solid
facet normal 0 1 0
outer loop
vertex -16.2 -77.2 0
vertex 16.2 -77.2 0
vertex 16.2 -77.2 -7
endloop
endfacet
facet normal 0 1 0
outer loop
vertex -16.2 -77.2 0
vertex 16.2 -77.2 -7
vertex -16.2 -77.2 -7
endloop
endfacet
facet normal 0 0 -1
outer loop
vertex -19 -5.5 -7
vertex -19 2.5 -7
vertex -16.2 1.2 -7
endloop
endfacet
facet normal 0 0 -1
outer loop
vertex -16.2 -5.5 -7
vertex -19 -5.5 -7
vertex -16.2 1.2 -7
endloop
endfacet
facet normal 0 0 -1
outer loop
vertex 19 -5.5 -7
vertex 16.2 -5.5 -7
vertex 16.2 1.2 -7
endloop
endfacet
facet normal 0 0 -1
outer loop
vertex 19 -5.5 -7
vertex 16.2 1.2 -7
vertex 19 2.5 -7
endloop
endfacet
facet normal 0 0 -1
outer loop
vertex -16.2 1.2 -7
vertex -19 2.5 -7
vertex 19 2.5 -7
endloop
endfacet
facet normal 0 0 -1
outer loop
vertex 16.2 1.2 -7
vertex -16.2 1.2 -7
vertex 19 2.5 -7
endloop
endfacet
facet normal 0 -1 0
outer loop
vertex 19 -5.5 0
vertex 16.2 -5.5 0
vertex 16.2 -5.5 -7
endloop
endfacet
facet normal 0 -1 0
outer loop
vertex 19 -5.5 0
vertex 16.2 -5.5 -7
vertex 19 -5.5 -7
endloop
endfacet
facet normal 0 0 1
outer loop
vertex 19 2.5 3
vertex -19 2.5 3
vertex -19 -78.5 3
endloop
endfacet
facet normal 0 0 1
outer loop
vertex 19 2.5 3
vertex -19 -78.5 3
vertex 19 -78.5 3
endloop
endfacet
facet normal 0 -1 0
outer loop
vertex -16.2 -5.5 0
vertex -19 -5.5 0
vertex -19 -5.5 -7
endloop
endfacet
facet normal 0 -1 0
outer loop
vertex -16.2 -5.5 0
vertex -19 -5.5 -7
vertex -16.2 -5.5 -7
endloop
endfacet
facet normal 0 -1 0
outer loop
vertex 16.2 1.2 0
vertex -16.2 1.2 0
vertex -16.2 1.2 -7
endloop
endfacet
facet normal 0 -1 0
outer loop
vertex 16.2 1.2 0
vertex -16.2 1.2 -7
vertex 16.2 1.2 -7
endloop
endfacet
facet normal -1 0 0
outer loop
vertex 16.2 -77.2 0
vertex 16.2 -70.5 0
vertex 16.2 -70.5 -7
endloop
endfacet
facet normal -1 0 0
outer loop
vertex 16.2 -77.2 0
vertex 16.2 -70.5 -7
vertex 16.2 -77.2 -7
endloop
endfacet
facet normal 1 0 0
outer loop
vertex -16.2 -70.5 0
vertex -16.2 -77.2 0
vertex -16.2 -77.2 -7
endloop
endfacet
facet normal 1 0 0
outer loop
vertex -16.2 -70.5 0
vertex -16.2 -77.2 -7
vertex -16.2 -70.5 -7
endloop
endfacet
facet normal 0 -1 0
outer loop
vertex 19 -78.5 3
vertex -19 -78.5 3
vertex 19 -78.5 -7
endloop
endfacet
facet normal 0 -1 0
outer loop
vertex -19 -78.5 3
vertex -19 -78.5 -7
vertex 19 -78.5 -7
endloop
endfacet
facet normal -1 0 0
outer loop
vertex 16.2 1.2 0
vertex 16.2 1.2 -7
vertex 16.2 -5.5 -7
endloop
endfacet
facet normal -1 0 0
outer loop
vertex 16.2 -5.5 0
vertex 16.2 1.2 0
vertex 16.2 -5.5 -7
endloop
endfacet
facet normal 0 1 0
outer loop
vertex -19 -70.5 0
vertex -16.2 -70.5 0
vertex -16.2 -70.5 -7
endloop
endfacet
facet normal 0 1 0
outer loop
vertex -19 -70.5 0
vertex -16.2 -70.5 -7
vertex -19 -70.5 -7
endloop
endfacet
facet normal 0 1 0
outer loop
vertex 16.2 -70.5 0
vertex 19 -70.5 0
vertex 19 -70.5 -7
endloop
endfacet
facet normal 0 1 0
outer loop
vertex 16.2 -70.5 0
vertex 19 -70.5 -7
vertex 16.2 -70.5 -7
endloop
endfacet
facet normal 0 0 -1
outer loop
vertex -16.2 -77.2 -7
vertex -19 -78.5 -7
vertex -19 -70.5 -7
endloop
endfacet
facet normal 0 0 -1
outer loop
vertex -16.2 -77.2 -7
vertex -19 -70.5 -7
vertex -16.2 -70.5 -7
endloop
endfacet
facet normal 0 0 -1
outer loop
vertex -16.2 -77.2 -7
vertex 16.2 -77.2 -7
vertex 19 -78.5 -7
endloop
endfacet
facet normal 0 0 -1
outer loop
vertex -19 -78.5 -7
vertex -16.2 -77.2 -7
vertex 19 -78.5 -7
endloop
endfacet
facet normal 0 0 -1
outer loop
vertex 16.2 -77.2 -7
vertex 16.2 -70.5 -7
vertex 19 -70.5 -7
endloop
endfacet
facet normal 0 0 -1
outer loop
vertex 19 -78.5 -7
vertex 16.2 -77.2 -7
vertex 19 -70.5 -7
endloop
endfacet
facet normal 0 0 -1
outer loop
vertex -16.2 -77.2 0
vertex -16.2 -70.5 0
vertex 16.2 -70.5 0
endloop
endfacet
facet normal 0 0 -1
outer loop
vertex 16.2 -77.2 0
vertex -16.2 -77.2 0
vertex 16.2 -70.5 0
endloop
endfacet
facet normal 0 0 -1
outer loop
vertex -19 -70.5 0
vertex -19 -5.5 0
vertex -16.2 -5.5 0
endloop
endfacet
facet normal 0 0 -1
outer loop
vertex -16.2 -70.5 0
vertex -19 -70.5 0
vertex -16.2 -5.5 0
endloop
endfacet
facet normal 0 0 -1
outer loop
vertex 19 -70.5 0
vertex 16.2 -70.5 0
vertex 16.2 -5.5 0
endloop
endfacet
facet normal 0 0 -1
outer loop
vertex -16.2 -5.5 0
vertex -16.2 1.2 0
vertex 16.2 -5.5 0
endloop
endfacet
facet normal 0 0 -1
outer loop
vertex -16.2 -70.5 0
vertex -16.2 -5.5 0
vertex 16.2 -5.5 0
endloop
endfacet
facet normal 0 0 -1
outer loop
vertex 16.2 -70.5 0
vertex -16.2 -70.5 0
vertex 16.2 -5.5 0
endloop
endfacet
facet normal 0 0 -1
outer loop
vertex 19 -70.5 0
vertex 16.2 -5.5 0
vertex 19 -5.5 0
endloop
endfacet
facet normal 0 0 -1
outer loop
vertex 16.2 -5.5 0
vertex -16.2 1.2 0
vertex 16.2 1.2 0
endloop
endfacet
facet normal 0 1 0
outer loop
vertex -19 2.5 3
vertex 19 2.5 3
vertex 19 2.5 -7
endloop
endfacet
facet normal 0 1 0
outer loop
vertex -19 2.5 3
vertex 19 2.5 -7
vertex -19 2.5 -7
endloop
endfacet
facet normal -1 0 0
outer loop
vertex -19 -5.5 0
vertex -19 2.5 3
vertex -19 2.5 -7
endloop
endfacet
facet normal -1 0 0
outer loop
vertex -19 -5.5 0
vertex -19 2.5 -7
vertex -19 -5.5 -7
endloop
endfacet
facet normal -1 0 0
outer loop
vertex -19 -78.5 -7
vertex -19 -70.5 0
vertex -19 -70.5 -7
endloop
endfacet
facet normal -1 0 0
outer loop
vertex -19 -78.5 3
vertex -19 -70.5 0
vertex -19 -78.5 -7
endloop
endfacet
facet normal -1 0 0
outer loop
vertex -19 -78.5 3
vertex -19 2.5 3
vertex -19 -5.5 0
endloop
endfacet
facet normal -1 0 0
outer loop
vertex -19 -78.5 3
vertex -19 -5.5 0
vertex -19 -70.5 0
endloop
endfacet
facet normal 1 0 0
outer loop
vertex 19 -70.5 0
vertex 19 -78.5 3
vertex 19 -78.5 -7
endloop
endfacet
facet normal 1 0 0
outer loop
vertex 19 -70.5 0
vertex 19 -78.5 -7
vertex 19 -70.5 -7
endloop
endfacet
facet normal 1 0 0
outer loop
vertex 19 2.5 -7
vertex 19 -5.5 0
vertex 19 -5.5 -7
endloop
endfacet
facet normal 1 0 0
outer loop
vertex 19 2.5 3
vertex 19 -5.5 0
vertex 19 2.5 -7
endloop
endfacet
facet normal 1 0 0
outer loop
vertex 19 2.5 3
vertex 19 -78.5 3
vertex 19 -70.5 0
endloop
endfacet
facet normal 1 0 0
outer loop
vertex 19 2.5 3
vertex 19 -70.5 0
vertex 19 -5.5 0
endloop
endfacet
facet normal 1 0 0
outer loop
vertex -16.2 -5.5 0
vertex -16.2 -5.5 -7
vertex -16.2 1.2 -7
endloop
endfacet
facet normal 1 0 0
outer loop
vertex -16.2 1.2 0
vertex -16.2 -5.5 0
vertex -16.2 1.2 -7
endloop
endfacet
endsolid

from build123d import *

# Parameters (mm, degrees)
SKETCH1_W           = 38
SKETCH1_H           = 81
BOSS_EXTRUDE1_DEPTH = 3
BOSS_EXTRUDE2_DEPTH = 7


with BuildPart() as part:
    # Sketch1 → Boss-Extrude1 (new body)
    with BuildSketch(Plane.XY):
        with Locations((0, -38)):
            Rectangle(SKETCH1_W, SKETCH1_H)
    extrude(amount=BOSS_EXTRUDE1_DEPTH)

    # Sketch2 → Boss-Extrude2 (add)
    with BuildSketch(Plane(origin=(0, 0, 0), x_dir=(-1, 0, 0), z_dir=(0, 0, -1))):
        Polygon((-19, -5.5), (-19, 2.5), (19, 2.5), (19, -5.5), (16.2, -5.5), (16.2, 1.2), (-16.2, 1.2), (-16.2, -5.5), align=None)
        Polygon((-16.2, -77.2), (16.2, -77.2), (16.2, -70.5), (19, -70.5), (19, -78.5), (-19, -78.5), (-19, -70.5), (-16.2, -70.5), align=None)
    extrude(amount=BOSS_EXTRUDE2_DEPTH)


solid = part.part
